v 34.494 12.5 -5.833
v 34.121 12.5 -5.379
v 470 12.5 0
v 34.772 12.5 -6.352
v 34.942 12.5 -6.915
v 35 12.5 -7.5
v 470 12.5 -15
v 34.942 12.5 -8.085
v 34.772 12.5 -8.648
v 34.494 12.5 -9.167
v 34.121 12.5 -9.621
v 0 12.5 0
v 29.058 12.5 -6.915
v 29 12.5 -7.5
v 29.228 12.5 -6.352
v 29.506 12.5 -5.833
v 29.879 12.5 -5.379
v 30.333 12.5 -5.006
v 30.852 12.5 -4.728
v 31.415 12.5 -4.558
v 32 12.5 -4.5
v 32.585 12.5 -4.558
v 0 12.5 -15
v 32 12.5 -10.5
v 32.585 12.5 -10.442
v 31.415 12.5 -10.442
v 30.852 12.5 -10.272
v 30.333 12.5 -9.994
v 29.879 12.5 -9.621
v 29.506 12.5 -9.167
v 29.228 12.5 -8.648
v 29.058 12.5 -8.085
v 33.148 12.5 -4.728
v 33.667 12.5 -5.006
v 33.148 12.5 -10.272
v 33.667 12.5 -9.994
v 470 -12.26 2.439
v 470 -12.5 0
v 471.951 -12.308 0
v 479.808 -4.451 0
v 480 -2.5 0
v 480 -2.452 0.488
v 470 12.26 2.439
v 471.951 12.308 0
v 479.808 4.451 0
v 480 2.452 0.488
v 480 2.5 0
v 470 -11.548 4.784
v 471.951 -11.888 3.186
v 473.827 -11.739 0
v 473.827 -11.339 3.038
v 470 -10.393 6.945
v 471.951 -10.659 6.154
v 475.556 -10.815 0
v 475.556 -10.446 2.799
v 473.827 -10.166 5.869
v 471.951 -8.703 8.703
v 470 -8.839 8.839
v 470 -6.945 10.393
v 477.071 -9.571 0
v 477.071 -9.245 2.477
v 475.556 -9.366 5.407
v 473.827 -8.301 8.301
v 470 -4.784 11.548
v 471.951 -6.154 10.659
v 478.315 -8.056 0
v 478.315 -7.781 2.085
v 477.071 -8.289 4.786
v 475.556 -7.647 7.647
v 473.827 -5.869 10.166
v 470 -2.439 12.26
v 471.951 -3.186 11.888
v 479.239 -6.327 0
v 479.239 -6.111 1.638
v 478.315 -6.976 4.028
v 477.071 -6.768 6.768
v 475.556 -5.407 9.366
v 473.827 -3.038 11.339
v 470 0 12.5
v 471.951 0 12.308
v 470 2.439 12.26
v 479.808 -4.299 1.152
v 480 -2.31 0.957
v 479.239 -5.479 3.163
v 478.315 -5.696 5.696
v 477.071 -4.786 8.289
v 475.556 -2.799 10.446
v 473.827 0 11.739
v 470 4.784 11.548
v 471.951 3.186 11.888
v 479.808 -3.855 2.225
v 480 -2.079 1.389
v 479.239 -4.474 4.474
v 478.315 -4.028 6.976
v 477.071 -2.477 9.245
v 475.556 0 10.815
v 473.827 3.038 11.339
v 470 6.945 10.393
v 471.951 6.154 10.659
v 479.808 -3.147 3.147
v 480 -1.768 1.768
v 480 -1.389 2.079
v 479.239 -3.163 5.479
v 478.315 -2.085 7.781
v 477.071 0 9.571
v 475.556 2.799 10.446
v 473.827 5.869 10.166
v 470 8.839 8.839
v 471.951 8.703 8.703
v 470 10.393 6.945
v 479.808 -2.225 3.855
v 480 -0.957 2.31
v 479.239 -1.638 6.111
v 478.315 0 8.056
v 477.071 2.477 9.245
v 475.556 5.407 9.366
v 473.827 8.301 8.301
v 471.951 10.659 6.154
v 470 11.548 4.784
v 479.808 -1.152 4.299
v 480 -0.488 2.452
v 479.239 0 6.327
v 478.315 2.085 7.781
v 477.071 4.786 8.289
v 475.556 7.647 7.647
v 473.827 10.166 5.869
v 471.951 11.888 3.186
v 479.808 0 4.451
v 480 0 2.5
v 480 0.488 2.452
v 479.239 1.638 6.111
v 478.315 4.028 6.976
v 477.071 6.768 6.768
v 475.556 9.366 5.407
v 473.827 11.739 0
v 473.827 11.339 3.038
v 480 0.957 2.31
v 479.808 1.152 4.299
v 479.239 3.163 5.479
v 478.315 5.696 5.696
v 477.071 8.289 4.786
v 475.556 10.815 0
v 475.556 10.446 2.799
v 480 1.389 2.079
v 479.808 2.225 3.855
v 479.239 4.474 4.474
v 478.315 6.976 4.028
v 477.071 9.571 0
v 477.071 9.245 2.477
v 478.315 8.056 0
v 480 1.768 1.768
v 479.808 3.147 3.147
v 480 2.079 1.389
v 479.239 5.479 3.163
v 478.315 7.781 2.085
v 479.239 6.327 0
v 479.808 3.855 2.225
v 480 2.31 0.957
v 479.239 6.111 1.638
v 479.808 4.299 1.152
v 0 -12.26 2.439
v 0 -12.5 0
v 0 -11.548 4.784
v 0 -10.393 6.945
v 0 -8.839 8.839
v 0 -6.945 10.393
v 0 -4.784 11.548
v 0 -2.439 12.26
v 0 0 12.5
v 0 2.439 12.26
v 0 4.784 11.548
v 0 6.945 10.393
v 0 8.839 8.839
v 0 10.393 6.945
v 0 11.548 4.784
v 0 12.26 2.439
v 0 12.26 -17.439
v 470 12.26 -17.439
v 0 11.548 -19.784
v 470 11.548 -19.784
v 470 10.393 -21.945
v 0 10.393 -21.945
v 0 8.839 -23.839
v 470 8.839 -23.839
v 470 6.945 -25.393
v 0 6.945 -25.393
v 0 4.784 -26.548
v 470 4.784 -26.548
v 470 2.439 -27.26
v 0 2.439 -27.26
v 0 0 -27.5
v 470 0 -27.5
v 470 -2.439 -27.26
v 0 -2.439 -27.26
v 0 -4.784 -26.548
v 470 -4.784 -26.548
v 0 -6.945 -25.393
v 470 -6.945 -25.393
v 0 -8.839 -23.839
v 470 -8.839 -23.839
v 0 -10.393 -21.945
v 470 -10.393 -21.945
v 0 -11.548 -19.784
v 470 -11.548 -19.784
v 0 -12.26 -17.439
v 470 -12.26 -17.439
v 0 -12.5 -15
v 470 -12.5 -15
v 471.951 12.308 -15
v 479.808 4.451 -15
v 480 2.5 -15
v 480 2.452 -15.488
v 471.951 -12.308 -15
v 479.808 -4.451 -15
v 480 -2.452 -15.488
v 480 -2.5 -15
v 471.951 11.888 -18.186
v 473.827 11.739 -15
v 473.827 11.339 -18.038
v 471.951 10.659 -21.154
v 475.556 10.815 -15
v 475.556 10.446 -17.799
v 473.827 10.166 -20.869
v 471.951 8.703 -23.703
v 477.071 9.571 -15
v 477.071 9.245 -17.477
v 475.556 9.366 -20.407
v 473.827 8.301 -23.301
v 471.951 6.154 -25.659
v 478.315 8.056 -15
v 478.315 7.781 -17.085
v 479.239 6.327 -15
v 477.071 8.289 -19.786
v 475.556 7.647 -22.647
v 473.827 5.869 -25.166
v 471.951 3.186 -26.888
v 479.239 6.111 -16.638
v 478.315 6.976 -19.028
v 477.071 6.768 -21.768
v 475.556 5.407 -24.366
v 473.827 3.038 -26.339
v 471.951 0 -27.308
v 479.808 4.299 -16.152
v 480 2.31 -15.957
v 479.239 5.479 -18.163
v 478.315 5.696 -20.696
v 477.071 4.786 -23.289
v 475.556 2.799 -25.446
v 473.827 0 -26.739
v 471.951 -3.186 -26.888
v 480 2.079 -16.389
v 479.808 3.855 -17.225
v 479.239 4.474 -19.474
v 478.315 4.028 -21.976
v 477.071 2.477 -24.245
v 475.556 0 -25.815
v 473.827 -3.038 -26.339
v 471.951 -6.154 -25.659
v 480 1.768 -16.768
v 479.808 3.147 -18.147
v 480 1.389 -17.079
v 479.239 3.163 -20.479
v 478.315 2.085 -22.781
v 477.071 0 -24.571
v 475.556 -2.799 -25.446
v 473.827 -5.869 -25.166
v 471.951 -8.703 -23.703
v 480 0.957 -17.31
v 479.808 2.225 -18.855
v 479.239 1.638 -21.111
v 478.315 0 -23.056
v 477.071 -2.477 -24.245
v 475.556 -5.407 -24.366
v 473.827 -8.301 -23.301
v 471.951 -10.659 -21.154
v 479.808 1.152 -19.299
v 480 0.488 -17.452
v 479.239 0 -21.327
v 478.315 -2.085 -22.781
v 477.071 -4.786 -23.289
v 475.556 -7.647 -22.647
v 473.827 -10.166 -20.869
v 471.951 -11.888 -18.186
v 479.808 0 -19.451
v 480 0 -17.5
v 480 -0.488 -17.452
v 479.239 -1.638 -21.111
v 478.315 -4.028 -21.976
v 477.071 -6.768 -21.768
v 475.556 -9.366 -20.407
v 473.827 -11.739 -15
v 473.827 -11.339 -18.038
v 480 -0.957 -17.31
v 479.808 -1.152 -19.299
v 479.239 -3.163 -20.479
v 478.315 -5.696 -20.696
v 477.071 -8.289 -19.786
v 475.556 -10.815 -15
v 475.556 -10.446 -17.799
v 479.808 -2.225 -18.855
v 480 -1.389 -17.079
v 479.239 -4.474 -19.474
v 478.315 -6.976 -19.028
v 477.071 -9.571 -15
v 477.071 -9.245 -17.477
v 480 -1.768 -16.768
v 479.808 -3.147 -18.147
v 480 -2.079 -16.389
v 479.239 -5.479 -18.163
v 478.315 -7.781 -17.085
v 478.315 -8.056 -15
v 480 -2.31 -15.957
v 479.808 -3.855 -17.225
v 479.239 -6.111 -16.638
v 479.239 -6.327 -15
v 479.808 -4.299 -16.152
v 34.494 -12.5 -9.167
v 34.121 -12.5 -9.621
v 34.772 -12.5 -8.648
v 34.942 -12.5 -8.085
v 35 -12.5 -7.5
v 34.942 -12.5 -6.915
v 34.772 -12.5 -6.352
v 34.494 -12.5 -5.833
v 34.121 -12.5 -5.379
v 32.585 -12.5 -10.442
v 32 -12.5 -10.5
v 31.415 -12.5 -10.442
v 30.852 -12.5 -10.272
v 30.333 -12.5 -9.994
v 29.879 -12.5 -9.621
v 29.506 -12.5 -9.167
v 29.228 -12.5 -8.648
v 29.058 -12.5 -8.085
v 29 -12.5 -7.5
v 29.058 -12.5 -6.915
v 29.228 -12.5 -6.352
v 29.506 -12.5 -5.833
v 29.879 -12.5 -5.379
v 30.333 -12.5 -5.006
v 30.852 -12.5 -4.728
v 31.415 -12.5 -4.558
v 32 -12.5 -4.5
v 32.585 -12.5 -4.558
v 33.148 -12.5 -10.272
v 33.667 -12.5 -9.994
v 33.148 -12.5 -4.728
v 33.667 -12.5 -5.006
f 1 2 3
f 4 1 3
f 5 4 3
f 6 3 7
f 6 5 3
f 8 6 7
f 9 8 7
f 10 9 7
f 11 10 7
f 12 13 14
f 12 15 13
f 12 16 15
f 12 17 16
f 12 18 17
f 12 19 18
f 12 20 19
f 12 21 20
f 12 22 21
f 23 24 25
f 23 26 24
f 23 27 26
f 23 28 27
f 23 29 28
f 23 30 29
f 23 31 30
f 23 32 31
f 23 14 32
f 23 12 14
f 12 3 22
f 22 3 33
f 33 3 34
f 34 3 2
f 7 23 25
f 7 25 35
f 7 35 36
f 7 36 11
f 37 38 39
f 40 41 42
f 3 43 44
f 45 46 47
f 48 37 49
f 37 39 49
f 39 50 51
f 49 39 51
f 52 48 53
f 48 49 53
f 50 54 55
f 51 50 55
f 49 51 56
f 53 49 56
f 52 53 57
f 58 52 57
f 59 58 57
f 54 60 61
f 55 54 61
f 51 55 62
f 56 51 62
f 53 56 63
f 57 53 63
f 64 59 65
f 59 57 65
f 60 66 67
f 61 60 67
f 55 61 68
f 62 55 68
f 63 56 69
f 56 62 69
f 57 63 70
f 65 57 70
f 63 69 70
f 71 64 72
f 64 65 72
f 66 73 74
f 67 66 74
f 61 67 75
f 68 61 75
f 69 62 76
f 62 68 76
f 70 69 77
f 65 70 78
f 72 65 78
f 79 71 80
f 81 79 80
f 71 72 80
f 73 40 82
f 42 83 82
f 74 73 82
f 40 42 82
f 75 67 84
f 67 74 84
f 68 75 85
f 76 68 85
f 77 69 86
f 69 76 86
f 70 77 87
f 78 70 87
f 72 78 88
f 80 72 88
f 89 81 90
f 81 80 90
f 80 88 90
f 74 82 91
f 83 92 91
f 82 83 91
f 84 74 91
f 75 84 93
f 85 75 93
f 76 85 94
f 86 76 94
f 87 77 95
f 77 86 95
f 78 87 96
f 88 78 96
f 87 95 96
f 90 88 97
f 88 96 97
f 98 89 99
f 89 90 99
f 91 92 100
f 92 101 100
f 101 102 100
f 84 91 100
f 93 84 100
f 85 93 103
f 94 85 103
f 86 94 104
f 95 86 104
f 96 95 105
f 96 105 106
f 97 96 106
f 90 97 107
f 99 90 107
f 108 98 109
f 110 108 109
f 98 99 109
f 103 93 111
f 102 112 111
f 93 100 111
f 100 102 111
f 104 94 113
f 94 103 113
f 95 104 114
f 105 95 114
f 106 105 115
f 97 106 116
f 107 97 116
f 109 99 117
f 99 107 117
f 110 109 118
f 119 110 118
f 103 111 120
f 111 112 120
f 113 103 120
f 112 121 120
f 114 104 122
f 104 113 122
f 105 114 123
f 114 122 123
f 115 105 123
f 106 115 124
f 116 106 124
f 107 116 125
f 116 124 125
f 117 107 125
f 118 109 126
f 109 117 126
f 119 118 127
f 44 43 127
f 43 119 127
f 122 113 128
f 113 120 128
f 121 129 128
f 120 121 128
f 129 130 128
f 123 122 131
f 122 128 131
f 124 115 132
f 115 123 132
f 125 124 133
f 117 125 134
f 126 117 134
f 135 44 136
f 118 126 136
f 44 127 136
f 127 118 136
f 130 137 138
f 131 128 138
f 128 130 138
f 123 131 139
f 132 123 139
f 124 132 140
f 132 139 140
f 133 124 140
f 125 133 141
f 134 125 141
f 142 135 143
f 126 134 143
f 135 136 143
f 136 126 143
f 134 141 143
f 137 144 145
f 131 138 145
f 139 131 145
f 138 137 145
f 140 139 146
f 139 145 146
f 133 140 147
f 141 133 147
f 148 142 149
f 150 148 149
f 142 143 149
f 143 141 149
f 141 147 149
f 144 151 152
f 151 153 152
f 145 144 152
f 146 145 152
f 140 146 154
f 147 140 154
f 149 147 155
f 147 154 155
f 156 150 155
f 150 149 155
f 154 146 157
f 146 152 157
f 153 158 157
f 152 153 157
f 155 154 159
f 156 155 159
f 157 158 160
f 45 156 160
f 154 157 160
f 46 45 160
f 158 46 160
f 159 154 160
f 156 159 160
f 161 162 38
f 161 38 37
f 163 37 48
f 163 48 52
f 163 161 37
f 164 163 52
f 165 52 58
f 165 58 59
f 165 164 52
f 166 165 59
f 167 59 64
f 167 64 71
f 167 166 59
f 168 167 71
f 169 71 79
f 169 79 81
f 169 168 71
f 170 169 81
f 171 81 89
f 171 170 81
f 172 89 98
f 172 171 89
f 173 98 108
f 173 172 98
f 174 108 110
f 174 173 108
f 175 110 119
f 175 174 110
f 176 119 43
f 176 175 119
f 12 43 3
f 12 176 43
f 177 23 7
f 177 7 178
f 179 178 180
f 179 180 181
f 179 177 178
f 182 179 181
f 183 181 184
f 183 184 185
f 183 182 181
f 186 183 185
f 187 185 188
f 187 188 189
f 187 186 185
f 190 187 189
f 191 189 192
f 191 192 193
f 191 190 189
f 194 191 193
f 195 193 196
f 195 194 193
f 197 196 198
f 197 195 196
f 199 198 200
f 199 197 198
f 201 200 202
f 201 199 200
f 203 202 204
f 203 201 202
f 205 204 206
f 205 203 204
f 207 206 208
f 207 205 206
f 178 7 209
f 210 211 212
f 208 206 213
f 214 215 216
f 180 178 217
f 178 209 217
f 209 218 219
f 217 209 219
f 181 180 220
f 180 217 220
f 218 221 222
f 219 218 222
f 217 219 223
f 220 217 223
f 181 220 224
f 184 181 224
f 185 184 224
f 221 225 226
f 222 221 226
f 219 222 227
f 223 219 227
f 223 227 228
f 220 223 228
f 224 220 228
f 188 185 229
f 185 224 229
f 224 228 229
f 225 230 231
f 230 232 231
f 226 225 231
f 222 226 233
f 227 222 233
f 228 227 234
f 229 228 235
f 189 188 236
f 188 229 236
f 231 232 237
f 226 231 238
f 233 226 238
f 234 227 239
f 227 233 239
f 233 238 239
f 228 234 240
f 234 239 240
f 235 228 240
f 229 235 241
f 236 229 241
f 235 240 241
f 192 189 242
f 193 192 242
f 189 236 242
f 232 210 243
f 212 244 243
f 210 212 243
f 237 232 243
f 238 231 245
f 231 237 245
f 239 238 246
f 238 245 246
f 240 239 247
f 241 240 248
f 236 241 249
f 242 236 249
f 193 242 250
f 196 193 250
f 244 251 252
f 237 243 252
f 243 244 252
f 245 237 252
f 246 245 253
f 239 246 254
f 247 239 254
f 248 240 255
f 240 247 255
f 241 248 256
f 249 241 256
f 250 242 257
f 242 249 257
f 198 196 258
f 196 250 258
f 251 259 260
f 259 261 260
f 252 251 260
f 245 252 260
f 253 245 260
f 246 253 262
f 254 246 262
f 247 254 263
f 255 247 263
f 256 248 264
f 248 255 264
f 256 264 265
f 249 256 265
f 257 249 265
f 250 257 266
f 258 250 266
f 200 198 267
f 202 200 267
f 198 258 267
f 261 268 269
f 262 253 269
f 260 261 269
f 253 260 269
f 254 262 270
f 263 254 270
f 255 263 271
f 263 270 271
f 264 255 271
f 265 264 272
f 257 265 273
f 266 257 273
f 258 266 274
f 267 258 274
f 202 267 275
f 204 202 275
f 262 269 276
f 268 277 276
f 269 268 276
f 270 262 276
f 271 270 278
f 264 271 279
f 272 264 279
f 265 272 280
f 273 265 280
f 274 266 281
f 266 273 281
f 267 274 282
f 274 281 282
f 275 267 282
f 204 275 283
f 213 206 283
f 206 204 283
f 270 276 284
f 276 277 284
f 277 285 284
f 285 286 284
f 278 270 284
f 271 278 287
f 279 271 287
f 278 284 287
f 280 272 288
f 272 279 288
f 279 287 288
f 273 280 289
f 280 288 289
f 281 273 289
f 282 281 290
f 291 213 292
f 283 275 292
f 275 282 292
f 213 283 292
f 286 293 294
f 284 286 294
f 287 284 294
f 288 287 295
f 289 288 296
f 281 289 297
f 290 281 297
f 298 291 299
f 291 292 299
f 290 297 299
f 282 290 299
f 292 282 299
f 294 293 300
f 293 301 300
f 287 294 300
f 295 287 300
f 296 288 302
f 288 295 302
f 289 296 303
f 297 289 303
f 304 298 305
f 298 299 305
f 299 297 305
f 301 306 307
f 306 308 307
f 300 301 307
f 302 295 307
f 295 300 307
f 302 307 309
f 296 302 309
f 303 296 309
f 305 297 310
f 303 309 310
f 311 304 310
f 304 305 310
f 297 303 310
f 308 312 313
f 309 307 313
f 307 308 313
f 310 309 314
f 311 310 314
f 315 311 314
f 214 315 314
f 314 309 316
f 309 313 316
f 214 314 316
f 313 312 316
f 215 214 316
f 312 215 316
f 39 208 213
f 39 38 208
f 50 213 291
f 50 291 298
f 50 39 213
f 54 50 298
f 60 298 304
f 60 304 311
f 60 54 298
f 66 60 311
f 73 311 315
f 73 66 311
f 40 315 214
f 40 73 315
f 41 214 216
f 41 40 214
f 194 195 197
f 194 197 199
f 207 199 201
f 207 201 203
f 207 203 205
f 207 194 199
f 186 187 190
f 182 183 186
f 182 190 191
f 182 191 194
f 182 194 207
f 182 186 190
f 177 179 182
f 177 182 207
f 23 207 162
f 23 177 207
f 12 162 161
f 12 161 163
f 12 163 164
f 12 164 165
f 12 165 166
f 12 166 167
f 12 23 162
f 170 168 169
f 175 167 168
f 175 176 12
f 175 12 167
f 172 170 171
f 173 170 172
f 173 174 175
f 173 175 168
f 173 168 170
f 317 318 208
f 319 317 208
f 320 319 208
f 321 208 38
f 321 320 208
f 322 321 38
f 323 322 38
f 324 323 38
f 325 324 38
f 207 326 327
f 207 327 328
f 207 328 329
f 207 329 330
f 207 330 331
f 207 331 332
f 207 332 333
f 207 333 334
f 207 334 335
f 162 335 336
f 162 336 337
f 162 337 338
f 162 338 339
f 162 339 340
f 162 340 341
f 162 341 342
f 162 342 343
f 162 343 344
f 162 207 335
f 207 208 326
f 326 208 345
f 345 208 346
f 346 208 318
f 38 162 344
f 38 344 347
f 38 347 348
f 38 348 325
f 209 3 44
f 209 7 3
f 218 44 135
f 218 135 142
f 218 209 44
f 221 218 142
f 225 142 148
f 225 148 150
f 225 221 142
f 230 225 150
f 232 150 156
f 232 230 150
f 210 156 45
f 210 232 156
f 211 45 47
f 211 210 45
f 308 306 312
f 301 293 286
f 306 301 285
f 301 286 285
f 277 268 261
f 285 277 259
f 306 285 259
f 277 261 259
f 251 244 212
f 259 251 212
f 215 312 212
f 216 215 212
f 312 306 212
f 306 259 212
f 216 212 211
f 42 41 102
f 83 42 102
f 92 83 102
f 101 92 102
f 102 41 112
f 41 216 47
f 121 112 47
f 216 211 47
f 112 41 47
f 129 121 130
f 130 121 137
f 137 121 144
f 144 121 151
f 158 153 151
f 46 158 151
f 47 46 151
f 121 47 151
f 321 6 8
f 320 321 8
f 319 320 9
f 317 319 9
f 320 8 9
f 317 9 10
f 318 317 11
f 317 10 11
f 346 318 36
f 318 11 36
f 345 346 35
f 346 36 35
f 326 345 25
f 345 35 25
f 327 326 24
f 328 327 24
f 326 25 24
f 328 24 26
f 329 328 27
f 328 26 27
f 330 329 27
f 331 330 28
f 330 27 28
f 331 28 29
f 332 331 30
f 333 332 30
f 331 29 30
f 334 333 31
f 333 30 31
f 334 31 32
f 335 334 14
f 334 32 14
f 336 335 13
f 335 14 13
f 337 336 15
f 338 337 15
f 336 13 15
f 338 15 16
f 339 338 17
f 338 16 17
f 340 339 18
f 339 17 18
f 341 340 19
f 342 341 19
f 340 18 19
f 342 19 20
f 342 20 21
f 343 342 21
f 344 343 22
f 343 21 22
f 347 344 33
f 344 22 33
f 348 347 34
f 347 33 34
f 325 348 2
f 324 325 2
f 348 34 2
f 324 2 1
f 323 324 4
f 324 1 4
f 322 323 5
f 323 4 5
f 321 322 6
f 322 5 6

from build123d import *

# Parameters (mm, degrees)
SALIENTE_EXTRUIR1_DEPTH = 480
REDONDEO1_R             = 10
CROQUIS2_R              = 3
CORTAR_EXTRUIR1_DEPTH   = 25


with BuildPart() as part:
    # Croquis1 → Saliente-Extruir1 (new body)
    with BuildSketch(Plane(origin=(0, 0, 0), x_dir=(0, 0, -1), z_dir=(1, 0, 0))):
        with BuildLine():
            Line((0, 12.5), (15, 12.5))
            ThreePointArc((15, 12.5), (27.5, 0), (15, -12.5))
            Line((15, -12.5), (0, -12.5))
            ThreePointArc((0, -12.5), (-12.5, 0), (0, 12.5))
        make_face()
    extrude(amount=SALIENTE_EXTRUIR1_DEPTH)

    # Redondeo1
    redondeo1_edges = [part.edges().sort_by_distance(p)[0] for p in [
        (480, 0, -27.5),
        (480, 12.5, -7.5),
        (480, 0, 12.5),
        (480, -12.5, -7.5),
    ]]
    fillet(redondeo1_edges, radius=REDONDEO1_R)

    # Croquis2 → Cortar-Extruir1 (cut)
    with BuildSketch(Plane(origin=(0, 12.5, 0), x_dir=(1, 0, 0), z_dir=(0, 1, 0))):
        with Locations((32, 7.5)):
            Circle(CROQUIS2_R)
    extrude(amount=-CORTAR_EXTRUIR1_DEPTH, mode=Mode.SUBTRACT)


solid = part.part
